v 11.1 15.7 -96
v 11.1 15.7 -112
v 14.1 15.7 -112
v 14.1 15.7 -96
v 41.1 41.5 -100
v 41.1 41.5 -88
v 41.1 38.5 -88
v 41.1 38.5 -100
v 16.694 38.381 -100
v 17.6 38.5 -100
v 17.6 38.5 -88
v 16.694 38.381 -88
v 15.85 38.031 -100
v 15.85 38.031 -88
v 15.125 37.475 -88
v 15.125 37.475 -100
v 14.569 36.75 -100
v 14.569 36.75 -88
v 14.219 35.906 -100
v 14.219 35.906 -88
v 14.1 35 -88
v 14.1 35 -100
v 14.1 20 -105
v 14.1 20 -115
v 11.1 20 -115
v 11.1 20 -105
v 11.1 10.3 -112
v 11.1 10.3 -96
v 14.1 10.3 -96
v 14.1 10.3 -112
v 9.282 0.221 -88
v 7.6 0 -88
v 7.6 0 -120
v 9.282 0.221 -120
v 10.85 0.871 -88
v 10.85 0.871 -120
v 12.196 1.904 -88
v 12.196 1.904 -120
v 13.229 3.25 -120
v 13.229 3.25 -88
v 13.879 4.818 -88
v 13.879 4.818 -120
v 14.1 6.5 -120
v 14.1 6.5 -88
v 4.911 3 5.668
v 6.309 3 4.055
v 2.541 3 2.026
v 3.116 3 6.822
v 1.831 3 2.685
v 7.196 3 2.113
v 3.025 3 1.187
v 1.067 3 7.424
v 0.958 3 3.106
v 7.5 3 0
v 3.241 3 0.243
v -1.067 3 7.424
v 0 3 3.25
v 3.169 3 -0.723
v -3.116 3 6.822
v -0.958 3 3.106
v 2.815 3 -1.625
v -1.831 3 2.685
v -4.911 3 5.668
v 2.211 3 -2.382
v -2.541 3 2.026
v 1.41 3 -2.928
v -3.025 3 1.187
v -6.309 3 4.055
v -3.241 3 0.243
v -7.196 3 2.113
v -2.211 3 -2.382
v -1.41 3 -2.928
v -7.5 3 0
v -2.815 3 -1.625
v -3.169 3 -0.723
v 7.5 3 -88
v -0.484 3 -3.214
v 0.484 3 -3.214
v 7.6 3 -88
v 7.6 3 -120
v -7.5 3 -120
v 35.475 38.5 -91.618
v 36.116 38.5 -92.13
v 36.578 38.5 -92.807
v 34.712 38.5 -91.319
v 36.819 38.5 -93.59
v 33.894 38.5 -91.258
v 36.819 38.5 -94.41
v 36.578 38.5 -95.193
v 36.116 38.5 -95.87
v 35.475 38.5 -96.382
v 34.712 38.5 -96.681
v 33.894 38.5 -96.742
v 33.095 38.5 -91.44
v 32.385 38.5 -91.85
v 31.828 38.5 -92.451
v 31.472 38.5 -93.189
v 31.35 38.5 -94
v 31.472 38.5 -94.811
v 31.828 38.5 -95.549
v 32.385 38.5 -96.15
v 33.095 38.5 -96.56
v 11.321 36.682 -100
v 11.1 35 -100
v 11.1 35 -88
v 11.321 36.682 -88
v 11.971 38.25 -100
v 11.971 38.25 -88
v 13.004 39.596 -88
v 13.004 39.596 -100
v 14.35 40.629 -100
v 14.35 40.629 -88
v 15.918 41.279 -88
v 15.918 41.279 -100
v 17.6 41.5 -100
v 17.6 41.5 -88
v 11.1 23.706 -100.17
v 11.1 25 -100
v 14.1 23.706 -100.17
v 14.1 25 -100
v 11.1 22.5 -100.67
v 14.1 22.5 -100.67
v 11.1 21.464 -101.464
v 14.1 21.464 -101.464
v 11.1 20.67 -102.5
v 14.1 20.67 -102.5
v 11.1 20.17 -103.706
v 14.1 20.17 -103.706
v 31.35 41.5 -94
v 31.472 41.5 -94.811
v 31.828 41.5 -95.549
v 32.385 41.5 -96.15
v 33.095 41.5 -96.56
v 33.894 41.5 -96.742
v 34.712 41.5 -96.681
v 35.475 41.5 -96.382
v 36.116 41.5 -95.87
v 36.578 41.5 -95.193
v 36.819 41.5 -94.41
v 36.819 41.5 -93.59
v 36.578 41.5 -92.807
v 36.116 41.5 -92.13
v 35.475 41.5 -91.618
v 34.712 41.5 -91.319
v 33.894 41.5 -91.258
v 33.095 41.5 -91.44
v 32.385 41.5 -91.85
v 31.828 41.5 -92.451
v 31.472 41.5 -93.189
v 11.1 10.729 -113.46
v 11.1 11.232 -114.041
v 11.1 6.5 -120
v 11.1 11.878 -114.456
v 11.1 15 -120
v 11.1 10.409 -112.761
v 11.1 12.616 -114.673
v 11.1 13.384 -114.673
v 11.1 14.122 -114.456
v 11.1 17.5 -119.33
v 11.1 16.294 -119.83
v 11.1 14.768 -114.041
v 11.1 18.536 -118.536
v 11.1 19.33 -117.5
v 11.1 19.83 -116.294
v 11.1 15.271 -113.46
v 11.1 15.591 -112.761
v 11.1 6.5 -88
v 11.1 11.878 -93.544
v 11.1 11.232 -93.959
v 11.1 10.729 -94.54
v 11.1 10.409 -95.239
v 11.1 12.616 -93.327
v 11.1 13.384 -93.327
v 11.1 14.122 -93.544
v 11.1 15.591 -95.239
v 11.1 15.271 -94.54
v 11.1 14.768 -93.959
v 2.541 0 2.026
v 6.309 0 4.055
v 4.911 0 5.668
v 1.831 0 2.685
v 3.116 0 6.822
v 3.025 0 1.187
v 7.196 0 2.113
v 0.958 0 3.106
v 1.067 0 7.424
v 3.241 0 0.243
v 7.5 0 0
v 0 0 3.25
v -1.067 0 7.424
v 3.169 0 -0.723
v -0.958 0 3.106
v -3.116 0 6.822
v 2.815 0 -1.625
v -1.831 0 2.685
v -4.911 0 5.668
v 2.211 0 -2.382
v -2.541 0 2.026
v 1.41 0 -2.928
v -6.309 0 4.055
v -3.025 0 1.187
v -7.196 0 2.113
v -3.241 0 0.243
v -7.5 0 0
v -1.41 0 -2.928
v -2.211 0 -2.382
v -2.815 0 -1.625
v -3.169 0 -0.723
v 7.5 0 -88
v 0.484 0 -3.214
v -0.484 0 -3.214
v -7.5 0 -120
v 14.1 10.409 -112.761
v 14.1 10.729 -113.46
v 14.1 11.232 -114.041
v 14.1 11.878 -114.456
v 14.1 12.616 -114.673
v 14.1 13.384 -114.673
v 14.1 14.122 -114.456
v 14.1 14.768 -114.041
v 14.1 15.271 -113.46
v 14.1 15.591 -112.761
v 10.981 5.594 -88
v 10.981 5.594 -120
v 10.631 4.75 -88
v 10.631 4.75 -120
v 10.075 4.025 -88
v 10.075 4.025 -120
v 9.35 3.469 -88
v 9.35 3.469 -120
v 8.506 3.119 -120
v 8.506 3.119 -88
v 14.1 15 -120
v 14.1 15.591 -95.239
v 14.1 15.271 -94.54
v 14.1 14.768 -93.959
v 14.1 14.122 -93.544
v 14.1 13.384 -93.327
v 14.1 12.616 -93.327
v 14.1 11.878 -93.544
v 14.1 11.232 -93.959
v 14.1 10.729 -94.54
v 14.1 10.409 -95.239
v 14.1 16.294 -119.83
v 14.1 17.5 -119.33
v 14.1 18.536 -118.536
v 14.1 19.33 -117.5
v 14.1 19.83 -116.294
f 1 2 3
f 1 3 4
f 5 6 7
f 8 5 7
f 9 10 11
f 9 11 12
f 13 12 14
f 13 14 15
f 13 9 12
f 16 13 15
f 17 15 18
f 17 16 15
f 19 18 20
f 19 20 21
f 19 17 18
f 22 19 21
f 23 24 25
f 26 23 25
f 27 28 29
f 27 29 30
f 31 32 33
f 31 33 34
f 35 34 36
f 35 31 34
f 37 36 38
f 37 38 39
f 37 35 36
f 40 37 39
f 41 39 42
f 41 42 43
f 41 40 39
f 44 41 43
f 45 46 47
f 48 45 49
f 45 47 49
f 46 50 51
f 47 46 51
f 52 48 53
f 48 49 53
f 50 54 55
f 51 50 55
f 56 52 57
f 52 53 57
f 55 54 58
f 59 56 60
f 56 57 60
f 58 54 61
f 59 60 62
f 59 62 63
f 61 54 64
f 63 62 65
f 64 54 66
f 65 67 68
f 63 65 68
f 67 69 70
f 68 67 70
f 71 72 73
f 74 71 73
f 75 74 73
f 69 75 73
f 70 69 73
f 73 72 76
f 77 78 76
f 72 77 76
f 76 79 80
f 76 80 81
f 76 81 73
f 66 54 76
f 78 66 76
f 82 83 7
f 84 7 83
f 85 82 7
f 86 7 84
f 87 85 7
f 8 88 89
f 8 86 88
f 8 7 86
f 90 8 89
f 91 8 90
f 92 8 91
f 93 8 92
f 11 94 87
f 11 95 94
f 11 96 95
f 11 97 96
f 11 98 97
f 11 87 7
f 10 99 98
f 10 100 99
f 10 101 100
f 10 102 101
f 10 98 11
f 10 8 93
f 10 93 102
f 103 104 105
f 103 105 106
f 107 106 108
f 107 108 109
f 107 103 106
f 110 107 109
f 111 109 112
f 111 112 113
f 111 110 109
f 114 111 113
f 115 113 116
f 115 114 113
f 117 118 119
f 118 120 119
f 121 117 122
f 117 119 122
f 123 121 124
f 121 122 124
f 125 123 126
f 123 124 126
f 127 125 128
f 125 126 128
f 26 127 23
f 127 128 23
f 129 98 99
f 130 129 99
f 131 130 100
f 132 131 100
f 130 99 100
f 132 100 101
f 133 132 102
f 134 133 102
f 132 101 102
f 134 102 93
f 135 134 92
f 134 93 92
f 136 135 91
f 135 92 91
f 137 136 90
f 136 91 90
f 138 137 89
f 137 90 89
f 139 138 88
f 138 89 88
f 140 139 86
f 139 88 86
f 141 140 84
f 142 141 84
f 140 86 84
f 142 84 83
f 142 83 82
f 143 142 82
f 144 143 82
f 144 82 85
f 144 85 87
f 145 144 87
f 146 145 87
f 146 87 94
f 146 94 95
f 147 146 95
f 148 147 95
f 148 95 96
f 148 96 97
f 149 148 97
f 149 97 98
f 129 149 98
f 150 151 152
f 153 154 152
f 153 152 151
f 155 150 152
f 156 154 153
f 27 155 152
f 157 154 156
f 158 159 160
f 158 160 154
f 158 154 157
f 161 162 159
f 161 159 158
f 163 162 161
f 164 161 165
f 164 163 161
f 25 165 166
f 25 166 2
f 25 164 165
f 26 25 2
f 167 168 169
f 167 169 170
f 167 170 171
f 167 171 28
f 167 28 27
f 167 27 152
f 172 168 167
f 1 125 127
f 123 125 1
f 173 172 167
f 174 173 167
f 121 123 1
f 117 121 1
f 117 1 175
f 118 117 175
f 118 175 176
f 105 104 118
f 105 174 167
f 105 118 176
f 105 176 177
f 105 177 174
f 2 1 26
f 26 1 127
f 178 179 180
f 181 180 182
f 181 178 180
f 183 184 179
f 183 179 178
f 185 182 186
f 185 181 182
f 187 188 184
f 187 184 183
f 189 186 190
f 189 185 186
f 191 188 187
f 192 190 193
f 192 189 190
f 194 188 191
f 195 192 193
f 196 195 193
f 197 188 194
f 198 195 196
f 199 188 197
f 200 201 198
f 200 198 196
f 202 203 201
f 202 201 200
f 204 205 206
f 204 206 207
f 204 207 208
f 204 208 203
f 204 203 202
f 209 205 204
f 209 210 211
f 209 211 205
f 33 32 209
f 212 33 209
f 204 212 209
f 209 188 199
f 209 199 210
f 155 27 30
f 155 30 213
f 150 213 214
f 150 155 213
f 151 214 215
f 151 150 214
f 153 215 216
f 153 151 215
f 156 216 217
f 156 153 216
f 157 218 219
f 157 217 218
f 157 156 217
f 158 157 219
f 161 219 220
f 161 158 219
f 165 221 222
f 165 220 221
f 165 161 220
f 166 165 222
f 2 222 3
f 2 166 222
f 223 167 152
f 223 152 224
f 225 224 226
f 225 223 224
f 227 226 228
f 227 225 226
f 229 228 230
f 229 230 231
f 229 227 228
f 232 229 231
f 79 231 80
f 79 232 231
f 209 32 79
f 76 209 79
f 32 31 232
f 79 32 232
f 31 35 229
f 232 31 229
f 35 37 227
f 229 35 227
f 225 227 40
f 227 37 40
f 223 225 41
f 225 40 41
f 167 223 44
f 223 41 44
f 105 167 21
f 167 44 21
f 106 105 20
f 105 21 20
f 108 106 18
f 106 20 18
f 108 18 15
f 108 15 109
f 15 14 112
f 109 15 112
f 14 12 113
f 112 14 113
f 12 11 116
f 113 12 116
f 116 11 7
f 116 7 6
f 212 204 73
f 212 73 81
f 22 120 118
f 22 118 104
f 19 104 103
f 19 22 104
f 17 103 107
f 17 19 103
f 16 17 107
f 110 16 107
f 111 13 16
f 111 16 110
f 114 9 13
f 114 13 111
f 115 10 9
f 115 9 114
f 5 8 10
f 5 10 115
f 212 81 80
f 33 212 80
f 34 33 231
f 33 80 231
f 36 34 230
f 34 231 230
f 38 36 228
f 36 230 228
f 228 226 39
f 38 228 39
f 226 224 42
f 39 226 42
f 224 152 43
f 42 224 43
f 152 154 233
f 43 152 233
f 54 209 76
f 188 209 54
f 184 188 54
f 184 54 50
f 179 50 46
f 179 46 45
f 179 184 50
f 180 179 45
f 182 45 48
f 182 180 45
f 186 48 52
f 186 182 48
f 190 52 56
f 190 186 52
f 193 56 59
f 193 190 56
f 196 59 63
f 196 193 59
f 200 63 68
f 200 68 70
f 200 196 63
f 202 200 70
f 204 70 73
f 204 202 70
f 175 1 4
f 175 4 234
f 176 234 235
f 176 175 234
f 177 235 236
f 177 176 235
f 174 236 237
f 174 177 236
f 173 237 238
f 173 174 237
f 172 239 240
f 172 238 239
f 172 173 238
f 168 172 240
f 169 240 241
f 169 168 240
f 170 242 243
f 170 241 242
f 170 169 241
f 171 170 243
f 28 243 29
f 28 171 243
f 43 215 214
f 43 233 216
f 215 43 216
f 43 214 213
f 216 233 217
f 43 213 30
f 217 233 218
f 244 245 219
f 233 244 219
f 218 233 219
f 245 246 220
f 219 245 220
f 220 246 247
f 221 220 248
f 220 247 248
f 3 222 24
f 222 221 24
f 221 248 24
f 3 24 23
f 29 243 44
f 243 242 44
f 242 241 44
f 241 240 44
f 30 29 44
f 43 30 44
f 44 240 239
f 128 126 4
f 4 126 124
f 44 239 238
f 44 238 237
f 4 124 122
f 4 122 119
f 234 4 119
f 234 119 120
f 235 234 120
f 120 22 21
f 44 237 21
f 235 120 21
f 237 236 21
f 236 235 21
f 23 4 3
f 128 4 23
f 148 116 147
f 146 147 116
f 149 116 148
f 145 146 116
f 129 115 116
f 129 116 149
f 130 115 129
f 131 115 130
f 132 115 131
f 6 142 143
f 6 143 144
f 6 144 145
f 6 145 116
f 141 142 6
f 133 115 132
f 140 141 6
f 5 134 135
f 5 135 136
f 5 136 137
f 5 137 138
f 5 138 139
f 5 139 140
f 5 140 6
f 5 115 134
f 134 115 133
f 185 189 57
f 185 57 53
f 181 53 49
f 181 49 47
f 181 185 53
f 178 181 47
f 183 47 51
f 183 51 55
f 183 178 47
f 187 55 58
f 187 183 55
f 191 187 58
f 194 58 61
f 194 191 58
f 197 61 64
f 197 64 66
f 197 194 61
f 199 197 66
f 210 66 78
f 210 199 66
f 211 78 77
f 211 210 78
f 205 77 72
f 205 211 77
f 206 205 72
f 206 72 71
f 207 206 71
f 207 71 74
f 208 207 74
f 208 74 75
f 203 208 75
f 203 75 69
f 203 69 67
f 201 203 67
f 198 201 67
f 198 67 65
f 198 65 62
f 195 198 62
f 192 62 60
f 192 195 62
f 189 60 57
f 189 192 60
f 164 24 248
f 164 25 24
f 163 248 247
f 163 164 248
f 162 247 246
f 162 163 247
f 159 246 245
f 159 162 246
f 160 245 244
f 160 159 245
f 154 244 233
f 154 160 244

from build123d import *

# Parameters (mm, degrees)
SKETCH1_R            = 3.25
BOSS_EXTRUDE1_DEPTH  = 3
EDGE_FLANGE1_DEPTH   = 32
SKETCH12_W           = 12
SKETCH12_H           = 15
BOSS_EXTRUDE2_DEPTH  = 3
EDGE_FLANGE3_DEPTH   = 12
CUT_EXTRUDE1_DEPTH   = 131.469345059
FILLET1_R            = 5
M5_CLEARANCE_HOLE1_D = 5.5


# Sheet-metal steps are written as plain solids
with BuildPart() as part:
    # Sketch1 → Boss-Extrude1 (new body)
    with BuildSketch(Plane(origin=(0, 0, 0), x_dir=(1, 0, 0), z_dir=(0, 1, 0))):
        with BuildLine():
            Line((-7.5, 0), (-7.5, 120))
            Line((-7.5, 120), (7.6, 120))
            Line((7.6, 120), (7.6, 88))
            Line((7.6, 88), (7.5, 88))
            Line((7.5, 88), (7.5, 0))
            ThreePointArc((7.5, 0), (0, -7.5), (-7.5, 0))
        make_face()
        with Locations(Location((0, 0, 0), (0, 0, 270))):
            Circle(SKETCH1_R, mode=Mode.SUBTRACT)
    extrude(amount=BOSS_EXTRUDE1_DEPTH)

    # Edge-Flange1 section (across the edge) → Edge-Flange1 (add)
    with BuildSketch(Plane(origin=(11.1, 3, -88), x_dir=(-1, 0, 0), z_dir=(0, 0, -1))):
        with BuildLine():
            Line((-3, 3.5), (-3, 17))
            Line((-3, 17), (0, 17))
            Line((0, 17), (0, 3.5))
            ThreePointArc((0, 3.5), (1.025126266, 1.025126266), (3.5, 0))
            Line((3.5, 0), (3.5, -3))
            ThreePointArc((3.5, -3), (-1.096194078, -1.096194078), (-3, 3.5))
        make_face()
    extrude(amount=EDGE_FLANGE1_DEPTH)

    # Sketch12 → Boss-Extrude2 (add)
    with BuildSketch(Plane.ZY.offset(-11.1)):
        with Locations((-94, 27.5)):
            Rectangle(SKETCH12_W, SKETCH12_H)
    extrude(amount=-BOSS_EXTRUDE2_DEPTH)

    # Edge-Flange3 section (across the edge) → Edge-Flange3 (add)
    with BuildSketch(Plane(origin=(14.1, 38.5, -100), x_dir=(0, -1, 0), z_dir=(0, 0, 1))):
        with BuildLine():
            Line((-3, 3.5), (-3, 27))
            Line((-3, 27), (0, 27))
            Line((0, 27), (0, 3.5))
            ThreePointArc((0, 3.5), (1.025126266, 1.025126266), (3.5, 0))
            Line((3.5, 0), (3.5, -3))
            ThreePointArc((3.5, -3), (-1.096194078, -1.096194078), (-3, 3.5))
        make_face()
    extrude(amount=EDGE_FLANGE3_DEPTH)

    # Sketch16 → Cut-Extrude1 (cut, through all)
    with BuildSketch(Plane.ZY.offset(-11.1)):
        with BuildLine():
            Line((-112, 15.7), (-96, 15.7))
            ThreePointArc((-96, 15.7), (-93.3, 13), (-96, 10.3))
            Line((-96, 10.3), (-112, 10.3))
            ThreePointArc((-112, 10.3), (-114.7, 13), (-112, 15.7))
        make_face()
    extrude(amount=-CUT_EXTRUDE1_DEPTH, mode=Mode.SUBTRACT)

    # Fillet1
    fillet1_edges = [part.edges().sort_by_distance(p)[0] for p in [
        (12.6, 20, -120),
        (12.6, 20, -100),
    ]]
    fillet(fillet1_edges, radius=FILLET1_R)

    # M5 Clearance Hole1 (through all)
    with Locations(Plane(origin=(0, 41.5, 0), x_dir=(1, 0, 0), z_dir=(0, 1, 0))):
        with Locations((34.1, 94)):
            Hole(M5_CLEARANCE_HOLE1_D / 2)


solid = part.part
